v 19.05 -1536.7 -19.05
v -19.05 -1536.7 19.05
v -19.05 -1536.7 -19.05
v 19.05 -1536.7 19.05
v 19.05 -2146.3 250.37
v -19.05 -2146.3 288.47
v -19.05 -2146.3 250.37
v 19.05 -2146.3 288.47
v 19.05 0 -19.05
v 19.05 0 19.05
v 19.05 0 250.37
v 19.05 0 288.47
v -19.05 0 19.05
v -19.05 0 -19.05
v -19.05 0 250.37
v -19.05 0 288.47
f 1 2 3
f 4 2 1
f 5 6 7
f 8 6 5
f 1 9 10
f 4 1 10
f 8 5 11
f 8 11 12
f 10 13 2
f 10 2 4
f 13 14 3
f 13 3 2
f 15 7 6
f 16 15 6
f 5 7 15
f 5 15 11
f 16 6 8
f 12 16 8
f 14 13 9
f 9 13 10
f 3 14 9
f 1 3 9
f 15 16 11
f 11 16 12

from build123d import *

# Parameters (mm, degrees)
F0_W     = 38.1
F0_H     = 38.1
F1_DEPTH = 1536.7
F3_DEPTH = 609.6


with BuildPart() as f1:
    # F0 (on Front) → F1 (new body)
    with BuildSketch(Plane.XZ):
        Rectangle(F0_W, F0_H)
    extrude(amount=F1_DEPTH)


with BuildPart() as f2_1:
    # F2: copy of F1
    add(f1.part.moved(Location((0, 0, 269.4203))))

    # F3 (add): a face of the model
    f3_faces = [f2_1.faces().sort_by_distance(p)[0] for p in [
        (0, -1536.7, 269.4203),
    ]]
    extrude(f3_faces, amount=F3_DEPTH)


solid = Compound([f1.part, f2_1.part])
